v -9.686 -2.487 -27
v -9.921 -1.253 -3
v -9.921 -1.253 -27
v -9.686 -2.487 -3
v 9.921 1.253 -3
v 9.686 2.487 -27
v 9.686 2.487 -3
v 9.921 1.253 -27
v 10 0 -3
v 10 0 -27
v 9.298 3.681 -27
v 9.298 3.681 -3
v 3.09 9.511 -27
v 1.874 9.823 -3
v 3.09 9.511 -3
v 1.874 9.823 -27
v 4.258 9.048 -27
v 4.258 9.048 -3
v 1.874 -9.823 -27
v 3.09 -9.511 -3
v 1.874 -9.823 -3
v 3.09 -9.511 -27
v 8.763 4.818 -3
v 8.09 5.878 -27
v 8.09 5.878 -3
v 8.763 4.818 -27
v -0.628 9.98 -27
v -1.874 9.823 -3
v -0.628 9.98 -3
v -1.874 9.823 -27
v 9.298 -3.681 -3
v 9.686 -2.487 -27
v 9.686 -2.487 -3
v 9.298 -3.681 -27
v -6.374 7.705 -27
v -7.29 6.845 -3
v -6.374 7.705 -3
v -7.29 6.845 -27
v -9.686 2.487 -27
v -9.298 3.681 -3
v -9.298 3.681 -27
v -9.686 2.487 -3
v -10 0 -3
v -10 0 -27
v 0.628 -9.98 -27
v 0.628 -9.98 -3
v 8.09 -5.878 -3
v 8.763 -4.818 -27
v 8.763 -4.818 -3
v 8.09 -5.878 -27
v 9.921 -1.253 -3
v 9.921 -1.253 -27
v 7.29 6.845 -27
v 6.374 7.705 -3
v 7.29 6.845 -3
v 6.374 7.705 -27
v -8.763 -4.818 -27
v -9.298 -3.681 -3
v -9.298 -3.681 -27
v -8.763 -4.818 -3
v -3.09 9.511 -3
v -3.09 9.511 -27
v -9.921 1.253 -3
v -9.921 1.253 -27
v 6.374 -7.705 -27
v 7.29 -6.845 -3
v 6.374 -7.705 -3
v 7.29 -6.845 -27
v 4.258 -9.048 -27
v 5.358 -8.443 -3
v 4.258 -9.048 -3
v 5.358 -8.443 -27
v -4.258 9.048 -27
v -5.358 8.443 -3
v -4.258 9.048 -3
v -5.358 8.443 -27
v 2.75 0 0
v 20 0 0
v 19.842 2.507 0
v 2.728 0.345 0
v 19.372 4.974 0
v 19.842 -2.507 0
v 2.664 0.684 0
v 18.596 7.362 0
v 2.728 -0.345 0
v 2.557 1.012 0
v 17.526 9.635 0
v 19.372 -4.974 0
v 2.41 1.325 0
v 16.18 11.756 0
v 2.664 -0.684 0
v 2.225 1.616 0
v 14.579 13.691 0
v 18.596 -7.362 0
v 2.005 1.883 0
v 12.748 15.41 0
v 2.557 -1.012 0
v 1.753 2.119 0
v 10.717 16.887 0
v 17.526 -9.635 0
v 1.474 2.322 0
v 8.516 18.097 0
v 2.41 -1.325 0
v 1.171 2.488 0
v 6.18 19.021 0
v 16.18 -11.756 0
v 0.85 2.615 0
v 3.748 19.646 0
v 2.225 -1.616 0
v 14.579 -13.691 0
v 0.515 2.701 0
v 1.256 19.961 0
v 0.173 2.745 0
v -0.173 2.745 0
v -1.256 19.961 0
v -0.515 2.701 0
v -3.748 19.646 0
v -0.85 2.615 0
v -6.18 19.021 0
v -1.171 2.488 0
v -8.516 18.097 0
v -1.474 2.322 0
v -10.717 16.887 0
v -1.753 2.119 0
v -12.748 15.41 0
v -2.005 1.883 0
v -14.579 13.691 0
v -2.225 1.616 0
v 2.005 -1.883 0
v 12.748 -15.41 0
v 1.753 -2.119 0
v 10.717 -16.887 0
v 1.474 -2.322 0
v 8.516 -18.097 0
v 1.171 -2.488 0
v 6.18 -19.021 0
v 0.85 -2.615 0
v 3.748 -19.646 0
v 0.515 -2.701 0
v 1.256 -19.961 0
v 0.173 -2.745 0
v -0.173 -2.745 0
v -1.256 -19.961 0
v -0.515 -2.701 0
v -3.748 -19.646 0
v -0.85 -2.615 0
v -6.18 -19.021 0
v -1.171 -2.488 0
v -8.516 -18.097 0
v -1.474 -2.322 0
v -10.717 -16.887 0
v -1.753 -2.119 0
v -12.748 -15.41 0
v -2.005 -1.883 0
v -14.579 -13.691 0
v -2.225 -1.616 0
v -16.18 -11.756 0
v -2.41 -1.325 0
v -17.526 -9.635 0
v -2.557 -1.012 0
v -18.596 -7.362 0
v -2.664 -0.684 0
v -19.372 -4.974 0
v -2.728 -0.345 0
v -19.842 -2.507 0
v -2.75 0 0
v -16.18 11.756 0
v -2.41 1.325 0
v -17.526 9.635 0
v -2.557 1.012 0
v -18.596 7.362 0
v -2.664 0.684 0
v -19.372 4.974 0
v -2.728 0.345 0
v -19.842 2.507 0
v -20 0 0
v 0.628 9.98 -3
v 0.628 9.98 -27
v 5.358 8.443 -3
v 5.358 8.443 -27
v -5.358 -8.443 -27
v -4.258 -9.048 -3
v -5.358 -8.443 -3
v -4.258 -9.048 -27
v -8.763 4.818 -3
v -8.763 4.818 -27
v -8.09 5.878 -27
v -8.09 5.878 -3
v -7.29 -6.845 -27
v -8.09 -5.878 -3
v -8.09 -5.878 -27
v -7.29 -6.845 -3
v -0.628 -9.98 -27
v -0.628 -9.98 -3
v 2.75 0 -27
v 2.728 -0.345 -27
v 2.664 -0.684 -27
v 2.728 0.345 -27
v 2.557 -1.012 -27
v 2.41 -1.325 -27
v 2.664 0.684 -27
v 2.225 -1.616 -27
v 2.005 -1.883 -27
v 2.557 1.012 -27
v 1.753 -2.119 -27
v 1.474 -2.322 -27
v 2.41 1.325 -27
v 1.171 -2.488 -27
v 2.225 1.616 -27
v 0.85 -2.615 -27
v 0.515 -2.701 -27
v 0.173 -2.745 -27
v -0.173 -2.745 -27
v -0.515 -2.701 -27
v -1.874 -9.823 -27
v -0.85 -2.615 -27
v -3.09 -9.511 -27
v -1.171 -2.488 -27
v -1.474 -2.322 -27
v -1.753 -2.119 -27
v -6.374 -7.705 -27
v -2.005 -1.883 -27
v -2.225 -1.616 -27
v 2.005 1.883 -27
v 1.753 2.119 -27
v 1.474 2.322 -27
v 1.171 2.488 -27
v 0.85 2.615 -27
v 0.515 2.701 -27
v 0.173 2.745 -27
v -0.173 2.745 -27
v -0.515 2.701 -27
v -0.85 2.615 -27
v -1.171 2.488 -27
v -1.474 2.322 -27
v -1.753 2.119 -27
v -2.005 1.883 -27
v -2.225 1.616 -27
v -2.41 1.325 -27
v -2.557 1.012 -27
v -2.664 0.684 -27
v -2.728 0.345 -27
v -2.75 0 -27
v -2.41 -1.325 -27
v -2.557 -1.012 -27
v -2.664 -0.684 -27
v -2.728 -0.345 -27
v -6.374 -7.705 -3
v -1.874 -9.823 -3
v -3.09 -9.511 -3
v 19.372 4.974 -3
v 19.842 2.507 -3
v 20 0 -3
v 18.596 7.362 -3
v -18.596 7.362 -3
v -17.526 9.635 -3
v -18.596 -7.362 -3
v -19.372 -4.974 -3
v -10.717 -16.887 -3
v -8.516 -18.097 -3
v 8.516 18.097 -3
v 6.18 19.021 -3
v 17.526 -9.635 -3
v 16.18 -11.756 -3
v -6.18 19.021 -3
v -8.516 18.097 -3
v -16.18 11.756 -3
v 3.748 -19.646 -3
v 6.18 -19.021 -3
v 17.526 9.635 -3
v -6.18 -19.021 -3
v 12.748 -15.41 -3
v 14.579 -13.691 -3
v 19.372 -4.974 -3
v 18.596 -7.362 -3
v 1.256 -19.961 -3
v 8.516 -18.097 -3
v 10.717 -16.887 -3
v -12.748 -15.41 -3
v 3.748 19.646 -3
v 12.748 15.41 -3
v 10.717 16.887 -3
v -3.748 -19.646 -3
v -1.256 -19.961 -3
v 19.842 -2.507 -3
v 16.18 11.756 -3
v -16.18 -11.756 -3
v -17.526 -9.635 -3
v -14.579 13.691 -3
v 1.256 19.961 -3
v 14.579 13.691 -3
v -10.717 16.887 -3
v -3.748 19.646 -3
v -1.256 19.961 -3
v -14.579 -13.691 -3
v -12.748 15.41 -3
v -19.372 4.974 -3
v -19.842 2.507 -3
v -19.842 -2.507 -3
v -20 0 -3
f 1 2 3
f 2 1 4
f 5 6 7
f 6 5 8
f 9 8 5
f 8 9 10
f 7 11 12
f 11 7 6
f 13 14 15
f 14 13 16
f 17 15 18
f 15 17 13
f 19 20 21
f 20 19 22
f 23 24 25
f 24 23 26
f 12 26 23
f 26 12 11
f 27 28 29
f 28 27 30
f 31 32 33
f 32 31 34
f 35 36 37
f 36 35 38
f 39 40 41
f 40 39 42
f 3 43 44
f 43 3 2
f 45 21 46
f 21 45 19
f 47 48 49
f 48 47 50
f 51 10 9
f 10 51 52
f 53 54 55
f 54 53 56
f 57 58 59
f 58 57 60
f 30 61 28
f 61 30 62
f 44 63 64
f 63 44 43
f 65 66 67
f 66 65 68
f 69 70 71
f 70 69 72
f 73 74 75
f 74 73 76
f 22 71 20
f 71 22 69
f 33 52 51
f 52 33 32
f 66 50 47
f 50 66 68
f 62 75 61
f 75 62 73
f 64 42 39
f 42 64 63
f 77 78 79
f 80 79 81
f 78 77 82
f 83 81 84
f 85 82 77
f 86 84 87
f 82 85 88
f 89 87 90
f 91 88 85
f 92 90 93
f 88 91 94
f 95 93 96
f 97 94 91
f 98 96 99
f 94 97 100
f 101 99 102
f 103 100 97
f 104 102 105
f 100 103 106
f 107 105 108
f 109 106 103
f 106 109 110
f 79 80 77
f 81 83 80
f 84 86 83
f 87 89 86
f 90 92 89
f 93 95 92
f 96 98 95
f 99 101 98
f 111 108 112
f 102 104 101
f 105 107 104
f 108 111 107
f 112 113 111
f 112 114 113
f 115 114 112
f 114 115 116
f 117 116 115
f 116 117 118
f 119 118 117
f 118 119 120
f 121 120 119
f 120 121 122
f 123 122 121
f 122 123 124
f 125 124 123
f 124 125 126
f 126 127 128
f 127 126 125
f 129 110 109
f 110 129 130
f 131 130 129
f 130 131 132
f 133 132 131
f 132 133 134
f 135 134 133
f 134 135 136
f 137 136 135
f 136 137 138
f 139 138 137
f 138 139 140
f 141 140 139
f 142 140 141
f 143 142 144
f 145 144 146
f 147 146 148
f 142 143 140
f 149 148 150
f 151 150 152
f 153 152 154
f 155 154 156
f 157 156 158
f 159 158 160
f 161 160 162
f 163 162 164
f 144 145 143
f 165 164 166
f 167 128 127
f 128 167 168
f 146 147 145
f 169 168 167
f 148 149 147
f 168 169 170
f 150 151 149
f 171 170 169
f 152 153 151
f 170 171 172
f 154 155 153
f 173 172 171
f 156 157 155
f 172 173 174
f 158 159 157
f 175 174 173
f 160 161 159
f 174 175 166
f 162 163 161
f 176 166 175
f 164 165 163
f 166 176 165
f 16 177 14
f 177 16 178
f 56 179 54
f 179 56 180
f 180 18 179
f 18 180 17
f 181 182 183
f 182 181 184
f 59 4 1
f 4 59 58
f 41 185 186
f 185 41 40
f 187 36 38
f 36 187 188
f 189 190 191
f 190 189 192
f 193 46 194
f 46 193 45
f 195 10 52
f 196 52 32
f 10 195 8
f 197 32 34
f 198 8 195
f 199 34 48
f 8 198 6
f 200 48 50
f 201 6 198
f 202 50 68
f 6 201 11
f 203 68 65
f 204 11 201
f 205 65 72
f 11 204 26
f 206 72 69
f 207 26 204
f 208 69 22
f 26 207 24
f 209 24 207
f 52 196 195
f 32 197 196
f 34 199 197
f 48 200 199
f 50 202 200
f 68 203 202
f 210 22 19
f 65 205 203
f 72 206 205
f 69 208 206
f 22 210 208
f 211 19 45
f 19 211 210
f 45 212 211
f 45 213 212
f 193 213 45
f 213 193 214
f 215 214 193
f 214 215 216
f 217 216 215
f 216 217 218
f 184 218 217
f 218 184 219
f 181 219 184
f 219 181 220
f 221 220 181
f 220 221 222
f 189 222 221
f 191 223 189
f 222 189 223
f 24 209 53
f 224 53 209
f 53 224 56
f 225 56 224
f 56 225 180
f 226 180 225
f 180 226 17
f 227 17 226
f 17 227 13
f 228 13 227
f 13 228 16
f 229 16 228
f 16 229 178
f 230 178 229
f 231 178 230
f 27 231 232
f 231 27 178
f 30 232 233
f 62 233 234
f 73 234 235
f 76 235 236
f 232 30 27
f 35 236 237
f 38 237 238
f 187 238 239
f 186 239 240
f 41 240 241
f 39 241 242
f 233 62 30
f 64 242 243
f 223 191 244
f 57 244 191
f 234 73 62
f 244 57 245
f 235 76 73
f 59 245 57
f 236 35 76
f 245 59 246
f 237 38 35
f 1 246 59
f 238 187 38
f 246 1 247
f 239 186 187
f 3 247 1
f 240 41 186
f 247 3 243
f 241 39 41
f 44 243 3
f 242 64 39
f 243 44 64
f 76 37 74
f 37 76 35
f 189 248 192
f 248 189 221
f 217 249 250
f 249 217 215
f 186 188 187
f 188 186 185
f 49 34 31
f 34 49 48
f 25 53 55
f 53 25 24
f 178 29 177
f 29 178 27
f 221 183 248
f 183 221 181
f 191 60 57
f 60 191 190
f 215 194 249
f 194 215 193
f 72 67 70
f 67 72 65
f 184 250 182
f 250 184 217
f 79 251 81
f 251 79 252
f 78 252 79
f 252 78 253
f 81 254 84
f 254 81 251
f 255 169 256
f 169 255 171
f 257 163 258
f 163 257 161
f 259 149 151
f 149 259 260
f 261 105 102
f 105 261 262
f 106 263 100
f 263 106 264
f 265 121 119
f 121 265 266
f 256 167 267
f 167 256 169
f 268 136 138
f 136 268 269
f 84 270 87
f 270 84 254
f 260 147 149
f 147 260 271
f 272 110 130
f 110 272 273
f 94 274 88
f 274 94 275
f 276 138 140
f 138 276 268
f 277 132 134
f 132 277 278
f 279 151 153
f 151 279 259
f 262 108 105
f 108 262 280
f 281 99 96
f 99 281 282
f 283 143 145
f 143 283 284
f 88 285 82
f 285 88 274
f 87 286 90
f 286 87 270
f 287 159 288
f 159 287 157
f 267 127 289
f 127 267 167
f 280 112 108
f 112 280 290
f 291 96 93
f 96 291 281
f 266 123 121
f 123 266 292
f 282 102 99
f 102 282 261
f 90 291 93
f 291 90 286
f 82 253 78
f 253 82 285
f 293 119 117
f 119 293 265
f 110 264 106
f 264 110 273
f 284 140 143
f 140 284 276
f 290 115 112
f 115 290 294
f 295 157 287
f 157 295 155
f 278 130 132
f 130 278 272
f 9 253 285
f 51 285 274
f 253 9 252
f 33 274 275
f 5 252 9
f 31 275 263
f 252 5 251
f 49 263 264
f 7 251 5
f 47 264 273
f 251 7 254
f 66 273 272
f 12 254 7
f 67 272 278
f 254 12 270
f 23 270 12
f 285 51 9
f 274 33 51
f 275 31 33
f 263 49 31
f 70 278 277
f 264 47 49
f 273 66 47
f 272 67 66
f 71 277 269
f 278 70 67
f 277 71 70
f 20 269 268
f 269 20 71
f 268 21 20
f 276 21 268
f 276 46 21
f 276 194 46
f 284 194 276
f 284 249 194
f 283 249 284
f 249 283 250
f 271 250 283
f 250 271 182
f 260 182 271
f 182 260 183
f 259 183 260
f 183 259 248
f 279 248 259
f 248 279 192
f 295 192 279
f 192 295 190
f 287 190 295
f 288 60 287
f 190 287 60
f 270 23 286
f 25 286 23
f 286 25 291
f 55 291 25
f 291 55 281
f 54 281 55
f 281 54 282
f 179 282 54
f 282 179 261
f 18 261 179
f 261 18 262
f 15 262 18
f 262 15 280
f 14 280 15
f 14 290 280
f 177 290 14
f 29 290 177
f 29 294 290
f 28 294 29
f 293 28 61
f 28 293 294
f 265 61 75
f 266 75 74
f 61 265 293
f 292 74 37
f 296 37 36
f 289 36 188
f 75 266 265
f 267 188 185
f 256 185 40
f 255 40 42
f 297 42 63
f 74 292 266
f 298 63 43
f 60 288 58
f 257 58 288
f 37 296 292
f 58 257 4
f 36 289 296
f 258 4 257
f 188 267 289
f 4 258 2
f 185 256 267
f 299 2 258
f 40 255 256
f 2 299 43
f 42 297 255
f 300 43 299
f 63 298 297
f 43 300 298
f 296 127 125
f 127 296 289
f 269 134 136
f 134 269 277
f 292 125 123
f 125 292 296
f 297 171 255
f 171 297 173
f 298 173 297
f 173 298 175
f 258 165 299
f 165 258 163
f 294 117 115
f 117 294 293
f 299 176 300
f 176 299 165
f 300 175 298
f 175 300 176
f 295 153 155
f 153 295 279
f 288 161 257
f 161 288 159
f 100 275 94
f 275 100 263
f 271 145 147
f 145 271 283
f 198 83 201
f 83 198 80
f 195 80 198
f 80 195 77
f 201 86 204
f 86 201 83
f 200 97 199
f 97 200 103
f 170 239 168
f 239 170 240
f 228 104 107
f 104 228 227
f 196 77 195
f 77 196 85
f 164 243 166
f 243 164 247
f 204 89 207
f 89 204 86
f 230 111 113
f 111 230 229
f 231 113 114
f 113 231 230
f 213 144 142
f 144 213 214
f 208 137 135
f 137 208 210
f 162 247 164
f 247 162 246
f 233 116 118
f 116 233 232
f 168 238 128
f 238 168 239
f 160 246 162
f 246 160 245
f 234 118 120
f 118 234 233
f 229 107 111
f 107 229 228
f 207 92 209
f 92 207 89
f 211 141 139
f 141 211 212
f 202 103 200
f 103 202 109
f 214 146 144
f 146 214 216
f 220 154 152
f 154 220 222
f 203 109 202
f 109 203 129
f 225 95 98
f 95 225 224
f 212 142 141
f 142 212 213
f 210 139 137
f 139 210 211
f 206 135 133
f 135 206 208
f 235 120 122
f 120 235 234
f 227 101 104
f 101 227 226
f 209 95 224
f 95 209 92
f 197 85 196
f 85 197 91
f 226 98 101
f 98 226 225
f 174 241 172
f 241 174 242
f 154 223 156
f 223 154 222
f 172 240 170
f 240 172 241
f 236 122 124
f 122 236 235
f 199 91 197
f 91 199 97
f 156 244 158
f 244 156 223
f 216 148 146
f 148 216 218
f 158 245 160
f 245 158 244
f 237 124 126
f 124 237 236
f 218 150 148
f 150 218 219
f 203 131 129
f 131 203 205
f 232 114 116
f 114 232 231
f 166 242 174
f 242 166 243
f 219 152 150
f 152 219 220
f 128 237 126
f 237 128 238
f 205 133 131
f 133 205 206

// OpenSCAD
$fn = 50;


difference() {
	union() {
		translate(v = [0, 0, -27.0000000000]) {
			cylinder(h = 27, r = 10.0000000000);
		}
		translate(v = [0, 0, -3.0000000000]) {
			cylinder(h = 3, r = 20.0000000000);
		}
	}
	union() {
		#translate(v = [0, 0, -27]) {
			cylinder(h = 27, r = 2.7500000000);
		}
	}
}
